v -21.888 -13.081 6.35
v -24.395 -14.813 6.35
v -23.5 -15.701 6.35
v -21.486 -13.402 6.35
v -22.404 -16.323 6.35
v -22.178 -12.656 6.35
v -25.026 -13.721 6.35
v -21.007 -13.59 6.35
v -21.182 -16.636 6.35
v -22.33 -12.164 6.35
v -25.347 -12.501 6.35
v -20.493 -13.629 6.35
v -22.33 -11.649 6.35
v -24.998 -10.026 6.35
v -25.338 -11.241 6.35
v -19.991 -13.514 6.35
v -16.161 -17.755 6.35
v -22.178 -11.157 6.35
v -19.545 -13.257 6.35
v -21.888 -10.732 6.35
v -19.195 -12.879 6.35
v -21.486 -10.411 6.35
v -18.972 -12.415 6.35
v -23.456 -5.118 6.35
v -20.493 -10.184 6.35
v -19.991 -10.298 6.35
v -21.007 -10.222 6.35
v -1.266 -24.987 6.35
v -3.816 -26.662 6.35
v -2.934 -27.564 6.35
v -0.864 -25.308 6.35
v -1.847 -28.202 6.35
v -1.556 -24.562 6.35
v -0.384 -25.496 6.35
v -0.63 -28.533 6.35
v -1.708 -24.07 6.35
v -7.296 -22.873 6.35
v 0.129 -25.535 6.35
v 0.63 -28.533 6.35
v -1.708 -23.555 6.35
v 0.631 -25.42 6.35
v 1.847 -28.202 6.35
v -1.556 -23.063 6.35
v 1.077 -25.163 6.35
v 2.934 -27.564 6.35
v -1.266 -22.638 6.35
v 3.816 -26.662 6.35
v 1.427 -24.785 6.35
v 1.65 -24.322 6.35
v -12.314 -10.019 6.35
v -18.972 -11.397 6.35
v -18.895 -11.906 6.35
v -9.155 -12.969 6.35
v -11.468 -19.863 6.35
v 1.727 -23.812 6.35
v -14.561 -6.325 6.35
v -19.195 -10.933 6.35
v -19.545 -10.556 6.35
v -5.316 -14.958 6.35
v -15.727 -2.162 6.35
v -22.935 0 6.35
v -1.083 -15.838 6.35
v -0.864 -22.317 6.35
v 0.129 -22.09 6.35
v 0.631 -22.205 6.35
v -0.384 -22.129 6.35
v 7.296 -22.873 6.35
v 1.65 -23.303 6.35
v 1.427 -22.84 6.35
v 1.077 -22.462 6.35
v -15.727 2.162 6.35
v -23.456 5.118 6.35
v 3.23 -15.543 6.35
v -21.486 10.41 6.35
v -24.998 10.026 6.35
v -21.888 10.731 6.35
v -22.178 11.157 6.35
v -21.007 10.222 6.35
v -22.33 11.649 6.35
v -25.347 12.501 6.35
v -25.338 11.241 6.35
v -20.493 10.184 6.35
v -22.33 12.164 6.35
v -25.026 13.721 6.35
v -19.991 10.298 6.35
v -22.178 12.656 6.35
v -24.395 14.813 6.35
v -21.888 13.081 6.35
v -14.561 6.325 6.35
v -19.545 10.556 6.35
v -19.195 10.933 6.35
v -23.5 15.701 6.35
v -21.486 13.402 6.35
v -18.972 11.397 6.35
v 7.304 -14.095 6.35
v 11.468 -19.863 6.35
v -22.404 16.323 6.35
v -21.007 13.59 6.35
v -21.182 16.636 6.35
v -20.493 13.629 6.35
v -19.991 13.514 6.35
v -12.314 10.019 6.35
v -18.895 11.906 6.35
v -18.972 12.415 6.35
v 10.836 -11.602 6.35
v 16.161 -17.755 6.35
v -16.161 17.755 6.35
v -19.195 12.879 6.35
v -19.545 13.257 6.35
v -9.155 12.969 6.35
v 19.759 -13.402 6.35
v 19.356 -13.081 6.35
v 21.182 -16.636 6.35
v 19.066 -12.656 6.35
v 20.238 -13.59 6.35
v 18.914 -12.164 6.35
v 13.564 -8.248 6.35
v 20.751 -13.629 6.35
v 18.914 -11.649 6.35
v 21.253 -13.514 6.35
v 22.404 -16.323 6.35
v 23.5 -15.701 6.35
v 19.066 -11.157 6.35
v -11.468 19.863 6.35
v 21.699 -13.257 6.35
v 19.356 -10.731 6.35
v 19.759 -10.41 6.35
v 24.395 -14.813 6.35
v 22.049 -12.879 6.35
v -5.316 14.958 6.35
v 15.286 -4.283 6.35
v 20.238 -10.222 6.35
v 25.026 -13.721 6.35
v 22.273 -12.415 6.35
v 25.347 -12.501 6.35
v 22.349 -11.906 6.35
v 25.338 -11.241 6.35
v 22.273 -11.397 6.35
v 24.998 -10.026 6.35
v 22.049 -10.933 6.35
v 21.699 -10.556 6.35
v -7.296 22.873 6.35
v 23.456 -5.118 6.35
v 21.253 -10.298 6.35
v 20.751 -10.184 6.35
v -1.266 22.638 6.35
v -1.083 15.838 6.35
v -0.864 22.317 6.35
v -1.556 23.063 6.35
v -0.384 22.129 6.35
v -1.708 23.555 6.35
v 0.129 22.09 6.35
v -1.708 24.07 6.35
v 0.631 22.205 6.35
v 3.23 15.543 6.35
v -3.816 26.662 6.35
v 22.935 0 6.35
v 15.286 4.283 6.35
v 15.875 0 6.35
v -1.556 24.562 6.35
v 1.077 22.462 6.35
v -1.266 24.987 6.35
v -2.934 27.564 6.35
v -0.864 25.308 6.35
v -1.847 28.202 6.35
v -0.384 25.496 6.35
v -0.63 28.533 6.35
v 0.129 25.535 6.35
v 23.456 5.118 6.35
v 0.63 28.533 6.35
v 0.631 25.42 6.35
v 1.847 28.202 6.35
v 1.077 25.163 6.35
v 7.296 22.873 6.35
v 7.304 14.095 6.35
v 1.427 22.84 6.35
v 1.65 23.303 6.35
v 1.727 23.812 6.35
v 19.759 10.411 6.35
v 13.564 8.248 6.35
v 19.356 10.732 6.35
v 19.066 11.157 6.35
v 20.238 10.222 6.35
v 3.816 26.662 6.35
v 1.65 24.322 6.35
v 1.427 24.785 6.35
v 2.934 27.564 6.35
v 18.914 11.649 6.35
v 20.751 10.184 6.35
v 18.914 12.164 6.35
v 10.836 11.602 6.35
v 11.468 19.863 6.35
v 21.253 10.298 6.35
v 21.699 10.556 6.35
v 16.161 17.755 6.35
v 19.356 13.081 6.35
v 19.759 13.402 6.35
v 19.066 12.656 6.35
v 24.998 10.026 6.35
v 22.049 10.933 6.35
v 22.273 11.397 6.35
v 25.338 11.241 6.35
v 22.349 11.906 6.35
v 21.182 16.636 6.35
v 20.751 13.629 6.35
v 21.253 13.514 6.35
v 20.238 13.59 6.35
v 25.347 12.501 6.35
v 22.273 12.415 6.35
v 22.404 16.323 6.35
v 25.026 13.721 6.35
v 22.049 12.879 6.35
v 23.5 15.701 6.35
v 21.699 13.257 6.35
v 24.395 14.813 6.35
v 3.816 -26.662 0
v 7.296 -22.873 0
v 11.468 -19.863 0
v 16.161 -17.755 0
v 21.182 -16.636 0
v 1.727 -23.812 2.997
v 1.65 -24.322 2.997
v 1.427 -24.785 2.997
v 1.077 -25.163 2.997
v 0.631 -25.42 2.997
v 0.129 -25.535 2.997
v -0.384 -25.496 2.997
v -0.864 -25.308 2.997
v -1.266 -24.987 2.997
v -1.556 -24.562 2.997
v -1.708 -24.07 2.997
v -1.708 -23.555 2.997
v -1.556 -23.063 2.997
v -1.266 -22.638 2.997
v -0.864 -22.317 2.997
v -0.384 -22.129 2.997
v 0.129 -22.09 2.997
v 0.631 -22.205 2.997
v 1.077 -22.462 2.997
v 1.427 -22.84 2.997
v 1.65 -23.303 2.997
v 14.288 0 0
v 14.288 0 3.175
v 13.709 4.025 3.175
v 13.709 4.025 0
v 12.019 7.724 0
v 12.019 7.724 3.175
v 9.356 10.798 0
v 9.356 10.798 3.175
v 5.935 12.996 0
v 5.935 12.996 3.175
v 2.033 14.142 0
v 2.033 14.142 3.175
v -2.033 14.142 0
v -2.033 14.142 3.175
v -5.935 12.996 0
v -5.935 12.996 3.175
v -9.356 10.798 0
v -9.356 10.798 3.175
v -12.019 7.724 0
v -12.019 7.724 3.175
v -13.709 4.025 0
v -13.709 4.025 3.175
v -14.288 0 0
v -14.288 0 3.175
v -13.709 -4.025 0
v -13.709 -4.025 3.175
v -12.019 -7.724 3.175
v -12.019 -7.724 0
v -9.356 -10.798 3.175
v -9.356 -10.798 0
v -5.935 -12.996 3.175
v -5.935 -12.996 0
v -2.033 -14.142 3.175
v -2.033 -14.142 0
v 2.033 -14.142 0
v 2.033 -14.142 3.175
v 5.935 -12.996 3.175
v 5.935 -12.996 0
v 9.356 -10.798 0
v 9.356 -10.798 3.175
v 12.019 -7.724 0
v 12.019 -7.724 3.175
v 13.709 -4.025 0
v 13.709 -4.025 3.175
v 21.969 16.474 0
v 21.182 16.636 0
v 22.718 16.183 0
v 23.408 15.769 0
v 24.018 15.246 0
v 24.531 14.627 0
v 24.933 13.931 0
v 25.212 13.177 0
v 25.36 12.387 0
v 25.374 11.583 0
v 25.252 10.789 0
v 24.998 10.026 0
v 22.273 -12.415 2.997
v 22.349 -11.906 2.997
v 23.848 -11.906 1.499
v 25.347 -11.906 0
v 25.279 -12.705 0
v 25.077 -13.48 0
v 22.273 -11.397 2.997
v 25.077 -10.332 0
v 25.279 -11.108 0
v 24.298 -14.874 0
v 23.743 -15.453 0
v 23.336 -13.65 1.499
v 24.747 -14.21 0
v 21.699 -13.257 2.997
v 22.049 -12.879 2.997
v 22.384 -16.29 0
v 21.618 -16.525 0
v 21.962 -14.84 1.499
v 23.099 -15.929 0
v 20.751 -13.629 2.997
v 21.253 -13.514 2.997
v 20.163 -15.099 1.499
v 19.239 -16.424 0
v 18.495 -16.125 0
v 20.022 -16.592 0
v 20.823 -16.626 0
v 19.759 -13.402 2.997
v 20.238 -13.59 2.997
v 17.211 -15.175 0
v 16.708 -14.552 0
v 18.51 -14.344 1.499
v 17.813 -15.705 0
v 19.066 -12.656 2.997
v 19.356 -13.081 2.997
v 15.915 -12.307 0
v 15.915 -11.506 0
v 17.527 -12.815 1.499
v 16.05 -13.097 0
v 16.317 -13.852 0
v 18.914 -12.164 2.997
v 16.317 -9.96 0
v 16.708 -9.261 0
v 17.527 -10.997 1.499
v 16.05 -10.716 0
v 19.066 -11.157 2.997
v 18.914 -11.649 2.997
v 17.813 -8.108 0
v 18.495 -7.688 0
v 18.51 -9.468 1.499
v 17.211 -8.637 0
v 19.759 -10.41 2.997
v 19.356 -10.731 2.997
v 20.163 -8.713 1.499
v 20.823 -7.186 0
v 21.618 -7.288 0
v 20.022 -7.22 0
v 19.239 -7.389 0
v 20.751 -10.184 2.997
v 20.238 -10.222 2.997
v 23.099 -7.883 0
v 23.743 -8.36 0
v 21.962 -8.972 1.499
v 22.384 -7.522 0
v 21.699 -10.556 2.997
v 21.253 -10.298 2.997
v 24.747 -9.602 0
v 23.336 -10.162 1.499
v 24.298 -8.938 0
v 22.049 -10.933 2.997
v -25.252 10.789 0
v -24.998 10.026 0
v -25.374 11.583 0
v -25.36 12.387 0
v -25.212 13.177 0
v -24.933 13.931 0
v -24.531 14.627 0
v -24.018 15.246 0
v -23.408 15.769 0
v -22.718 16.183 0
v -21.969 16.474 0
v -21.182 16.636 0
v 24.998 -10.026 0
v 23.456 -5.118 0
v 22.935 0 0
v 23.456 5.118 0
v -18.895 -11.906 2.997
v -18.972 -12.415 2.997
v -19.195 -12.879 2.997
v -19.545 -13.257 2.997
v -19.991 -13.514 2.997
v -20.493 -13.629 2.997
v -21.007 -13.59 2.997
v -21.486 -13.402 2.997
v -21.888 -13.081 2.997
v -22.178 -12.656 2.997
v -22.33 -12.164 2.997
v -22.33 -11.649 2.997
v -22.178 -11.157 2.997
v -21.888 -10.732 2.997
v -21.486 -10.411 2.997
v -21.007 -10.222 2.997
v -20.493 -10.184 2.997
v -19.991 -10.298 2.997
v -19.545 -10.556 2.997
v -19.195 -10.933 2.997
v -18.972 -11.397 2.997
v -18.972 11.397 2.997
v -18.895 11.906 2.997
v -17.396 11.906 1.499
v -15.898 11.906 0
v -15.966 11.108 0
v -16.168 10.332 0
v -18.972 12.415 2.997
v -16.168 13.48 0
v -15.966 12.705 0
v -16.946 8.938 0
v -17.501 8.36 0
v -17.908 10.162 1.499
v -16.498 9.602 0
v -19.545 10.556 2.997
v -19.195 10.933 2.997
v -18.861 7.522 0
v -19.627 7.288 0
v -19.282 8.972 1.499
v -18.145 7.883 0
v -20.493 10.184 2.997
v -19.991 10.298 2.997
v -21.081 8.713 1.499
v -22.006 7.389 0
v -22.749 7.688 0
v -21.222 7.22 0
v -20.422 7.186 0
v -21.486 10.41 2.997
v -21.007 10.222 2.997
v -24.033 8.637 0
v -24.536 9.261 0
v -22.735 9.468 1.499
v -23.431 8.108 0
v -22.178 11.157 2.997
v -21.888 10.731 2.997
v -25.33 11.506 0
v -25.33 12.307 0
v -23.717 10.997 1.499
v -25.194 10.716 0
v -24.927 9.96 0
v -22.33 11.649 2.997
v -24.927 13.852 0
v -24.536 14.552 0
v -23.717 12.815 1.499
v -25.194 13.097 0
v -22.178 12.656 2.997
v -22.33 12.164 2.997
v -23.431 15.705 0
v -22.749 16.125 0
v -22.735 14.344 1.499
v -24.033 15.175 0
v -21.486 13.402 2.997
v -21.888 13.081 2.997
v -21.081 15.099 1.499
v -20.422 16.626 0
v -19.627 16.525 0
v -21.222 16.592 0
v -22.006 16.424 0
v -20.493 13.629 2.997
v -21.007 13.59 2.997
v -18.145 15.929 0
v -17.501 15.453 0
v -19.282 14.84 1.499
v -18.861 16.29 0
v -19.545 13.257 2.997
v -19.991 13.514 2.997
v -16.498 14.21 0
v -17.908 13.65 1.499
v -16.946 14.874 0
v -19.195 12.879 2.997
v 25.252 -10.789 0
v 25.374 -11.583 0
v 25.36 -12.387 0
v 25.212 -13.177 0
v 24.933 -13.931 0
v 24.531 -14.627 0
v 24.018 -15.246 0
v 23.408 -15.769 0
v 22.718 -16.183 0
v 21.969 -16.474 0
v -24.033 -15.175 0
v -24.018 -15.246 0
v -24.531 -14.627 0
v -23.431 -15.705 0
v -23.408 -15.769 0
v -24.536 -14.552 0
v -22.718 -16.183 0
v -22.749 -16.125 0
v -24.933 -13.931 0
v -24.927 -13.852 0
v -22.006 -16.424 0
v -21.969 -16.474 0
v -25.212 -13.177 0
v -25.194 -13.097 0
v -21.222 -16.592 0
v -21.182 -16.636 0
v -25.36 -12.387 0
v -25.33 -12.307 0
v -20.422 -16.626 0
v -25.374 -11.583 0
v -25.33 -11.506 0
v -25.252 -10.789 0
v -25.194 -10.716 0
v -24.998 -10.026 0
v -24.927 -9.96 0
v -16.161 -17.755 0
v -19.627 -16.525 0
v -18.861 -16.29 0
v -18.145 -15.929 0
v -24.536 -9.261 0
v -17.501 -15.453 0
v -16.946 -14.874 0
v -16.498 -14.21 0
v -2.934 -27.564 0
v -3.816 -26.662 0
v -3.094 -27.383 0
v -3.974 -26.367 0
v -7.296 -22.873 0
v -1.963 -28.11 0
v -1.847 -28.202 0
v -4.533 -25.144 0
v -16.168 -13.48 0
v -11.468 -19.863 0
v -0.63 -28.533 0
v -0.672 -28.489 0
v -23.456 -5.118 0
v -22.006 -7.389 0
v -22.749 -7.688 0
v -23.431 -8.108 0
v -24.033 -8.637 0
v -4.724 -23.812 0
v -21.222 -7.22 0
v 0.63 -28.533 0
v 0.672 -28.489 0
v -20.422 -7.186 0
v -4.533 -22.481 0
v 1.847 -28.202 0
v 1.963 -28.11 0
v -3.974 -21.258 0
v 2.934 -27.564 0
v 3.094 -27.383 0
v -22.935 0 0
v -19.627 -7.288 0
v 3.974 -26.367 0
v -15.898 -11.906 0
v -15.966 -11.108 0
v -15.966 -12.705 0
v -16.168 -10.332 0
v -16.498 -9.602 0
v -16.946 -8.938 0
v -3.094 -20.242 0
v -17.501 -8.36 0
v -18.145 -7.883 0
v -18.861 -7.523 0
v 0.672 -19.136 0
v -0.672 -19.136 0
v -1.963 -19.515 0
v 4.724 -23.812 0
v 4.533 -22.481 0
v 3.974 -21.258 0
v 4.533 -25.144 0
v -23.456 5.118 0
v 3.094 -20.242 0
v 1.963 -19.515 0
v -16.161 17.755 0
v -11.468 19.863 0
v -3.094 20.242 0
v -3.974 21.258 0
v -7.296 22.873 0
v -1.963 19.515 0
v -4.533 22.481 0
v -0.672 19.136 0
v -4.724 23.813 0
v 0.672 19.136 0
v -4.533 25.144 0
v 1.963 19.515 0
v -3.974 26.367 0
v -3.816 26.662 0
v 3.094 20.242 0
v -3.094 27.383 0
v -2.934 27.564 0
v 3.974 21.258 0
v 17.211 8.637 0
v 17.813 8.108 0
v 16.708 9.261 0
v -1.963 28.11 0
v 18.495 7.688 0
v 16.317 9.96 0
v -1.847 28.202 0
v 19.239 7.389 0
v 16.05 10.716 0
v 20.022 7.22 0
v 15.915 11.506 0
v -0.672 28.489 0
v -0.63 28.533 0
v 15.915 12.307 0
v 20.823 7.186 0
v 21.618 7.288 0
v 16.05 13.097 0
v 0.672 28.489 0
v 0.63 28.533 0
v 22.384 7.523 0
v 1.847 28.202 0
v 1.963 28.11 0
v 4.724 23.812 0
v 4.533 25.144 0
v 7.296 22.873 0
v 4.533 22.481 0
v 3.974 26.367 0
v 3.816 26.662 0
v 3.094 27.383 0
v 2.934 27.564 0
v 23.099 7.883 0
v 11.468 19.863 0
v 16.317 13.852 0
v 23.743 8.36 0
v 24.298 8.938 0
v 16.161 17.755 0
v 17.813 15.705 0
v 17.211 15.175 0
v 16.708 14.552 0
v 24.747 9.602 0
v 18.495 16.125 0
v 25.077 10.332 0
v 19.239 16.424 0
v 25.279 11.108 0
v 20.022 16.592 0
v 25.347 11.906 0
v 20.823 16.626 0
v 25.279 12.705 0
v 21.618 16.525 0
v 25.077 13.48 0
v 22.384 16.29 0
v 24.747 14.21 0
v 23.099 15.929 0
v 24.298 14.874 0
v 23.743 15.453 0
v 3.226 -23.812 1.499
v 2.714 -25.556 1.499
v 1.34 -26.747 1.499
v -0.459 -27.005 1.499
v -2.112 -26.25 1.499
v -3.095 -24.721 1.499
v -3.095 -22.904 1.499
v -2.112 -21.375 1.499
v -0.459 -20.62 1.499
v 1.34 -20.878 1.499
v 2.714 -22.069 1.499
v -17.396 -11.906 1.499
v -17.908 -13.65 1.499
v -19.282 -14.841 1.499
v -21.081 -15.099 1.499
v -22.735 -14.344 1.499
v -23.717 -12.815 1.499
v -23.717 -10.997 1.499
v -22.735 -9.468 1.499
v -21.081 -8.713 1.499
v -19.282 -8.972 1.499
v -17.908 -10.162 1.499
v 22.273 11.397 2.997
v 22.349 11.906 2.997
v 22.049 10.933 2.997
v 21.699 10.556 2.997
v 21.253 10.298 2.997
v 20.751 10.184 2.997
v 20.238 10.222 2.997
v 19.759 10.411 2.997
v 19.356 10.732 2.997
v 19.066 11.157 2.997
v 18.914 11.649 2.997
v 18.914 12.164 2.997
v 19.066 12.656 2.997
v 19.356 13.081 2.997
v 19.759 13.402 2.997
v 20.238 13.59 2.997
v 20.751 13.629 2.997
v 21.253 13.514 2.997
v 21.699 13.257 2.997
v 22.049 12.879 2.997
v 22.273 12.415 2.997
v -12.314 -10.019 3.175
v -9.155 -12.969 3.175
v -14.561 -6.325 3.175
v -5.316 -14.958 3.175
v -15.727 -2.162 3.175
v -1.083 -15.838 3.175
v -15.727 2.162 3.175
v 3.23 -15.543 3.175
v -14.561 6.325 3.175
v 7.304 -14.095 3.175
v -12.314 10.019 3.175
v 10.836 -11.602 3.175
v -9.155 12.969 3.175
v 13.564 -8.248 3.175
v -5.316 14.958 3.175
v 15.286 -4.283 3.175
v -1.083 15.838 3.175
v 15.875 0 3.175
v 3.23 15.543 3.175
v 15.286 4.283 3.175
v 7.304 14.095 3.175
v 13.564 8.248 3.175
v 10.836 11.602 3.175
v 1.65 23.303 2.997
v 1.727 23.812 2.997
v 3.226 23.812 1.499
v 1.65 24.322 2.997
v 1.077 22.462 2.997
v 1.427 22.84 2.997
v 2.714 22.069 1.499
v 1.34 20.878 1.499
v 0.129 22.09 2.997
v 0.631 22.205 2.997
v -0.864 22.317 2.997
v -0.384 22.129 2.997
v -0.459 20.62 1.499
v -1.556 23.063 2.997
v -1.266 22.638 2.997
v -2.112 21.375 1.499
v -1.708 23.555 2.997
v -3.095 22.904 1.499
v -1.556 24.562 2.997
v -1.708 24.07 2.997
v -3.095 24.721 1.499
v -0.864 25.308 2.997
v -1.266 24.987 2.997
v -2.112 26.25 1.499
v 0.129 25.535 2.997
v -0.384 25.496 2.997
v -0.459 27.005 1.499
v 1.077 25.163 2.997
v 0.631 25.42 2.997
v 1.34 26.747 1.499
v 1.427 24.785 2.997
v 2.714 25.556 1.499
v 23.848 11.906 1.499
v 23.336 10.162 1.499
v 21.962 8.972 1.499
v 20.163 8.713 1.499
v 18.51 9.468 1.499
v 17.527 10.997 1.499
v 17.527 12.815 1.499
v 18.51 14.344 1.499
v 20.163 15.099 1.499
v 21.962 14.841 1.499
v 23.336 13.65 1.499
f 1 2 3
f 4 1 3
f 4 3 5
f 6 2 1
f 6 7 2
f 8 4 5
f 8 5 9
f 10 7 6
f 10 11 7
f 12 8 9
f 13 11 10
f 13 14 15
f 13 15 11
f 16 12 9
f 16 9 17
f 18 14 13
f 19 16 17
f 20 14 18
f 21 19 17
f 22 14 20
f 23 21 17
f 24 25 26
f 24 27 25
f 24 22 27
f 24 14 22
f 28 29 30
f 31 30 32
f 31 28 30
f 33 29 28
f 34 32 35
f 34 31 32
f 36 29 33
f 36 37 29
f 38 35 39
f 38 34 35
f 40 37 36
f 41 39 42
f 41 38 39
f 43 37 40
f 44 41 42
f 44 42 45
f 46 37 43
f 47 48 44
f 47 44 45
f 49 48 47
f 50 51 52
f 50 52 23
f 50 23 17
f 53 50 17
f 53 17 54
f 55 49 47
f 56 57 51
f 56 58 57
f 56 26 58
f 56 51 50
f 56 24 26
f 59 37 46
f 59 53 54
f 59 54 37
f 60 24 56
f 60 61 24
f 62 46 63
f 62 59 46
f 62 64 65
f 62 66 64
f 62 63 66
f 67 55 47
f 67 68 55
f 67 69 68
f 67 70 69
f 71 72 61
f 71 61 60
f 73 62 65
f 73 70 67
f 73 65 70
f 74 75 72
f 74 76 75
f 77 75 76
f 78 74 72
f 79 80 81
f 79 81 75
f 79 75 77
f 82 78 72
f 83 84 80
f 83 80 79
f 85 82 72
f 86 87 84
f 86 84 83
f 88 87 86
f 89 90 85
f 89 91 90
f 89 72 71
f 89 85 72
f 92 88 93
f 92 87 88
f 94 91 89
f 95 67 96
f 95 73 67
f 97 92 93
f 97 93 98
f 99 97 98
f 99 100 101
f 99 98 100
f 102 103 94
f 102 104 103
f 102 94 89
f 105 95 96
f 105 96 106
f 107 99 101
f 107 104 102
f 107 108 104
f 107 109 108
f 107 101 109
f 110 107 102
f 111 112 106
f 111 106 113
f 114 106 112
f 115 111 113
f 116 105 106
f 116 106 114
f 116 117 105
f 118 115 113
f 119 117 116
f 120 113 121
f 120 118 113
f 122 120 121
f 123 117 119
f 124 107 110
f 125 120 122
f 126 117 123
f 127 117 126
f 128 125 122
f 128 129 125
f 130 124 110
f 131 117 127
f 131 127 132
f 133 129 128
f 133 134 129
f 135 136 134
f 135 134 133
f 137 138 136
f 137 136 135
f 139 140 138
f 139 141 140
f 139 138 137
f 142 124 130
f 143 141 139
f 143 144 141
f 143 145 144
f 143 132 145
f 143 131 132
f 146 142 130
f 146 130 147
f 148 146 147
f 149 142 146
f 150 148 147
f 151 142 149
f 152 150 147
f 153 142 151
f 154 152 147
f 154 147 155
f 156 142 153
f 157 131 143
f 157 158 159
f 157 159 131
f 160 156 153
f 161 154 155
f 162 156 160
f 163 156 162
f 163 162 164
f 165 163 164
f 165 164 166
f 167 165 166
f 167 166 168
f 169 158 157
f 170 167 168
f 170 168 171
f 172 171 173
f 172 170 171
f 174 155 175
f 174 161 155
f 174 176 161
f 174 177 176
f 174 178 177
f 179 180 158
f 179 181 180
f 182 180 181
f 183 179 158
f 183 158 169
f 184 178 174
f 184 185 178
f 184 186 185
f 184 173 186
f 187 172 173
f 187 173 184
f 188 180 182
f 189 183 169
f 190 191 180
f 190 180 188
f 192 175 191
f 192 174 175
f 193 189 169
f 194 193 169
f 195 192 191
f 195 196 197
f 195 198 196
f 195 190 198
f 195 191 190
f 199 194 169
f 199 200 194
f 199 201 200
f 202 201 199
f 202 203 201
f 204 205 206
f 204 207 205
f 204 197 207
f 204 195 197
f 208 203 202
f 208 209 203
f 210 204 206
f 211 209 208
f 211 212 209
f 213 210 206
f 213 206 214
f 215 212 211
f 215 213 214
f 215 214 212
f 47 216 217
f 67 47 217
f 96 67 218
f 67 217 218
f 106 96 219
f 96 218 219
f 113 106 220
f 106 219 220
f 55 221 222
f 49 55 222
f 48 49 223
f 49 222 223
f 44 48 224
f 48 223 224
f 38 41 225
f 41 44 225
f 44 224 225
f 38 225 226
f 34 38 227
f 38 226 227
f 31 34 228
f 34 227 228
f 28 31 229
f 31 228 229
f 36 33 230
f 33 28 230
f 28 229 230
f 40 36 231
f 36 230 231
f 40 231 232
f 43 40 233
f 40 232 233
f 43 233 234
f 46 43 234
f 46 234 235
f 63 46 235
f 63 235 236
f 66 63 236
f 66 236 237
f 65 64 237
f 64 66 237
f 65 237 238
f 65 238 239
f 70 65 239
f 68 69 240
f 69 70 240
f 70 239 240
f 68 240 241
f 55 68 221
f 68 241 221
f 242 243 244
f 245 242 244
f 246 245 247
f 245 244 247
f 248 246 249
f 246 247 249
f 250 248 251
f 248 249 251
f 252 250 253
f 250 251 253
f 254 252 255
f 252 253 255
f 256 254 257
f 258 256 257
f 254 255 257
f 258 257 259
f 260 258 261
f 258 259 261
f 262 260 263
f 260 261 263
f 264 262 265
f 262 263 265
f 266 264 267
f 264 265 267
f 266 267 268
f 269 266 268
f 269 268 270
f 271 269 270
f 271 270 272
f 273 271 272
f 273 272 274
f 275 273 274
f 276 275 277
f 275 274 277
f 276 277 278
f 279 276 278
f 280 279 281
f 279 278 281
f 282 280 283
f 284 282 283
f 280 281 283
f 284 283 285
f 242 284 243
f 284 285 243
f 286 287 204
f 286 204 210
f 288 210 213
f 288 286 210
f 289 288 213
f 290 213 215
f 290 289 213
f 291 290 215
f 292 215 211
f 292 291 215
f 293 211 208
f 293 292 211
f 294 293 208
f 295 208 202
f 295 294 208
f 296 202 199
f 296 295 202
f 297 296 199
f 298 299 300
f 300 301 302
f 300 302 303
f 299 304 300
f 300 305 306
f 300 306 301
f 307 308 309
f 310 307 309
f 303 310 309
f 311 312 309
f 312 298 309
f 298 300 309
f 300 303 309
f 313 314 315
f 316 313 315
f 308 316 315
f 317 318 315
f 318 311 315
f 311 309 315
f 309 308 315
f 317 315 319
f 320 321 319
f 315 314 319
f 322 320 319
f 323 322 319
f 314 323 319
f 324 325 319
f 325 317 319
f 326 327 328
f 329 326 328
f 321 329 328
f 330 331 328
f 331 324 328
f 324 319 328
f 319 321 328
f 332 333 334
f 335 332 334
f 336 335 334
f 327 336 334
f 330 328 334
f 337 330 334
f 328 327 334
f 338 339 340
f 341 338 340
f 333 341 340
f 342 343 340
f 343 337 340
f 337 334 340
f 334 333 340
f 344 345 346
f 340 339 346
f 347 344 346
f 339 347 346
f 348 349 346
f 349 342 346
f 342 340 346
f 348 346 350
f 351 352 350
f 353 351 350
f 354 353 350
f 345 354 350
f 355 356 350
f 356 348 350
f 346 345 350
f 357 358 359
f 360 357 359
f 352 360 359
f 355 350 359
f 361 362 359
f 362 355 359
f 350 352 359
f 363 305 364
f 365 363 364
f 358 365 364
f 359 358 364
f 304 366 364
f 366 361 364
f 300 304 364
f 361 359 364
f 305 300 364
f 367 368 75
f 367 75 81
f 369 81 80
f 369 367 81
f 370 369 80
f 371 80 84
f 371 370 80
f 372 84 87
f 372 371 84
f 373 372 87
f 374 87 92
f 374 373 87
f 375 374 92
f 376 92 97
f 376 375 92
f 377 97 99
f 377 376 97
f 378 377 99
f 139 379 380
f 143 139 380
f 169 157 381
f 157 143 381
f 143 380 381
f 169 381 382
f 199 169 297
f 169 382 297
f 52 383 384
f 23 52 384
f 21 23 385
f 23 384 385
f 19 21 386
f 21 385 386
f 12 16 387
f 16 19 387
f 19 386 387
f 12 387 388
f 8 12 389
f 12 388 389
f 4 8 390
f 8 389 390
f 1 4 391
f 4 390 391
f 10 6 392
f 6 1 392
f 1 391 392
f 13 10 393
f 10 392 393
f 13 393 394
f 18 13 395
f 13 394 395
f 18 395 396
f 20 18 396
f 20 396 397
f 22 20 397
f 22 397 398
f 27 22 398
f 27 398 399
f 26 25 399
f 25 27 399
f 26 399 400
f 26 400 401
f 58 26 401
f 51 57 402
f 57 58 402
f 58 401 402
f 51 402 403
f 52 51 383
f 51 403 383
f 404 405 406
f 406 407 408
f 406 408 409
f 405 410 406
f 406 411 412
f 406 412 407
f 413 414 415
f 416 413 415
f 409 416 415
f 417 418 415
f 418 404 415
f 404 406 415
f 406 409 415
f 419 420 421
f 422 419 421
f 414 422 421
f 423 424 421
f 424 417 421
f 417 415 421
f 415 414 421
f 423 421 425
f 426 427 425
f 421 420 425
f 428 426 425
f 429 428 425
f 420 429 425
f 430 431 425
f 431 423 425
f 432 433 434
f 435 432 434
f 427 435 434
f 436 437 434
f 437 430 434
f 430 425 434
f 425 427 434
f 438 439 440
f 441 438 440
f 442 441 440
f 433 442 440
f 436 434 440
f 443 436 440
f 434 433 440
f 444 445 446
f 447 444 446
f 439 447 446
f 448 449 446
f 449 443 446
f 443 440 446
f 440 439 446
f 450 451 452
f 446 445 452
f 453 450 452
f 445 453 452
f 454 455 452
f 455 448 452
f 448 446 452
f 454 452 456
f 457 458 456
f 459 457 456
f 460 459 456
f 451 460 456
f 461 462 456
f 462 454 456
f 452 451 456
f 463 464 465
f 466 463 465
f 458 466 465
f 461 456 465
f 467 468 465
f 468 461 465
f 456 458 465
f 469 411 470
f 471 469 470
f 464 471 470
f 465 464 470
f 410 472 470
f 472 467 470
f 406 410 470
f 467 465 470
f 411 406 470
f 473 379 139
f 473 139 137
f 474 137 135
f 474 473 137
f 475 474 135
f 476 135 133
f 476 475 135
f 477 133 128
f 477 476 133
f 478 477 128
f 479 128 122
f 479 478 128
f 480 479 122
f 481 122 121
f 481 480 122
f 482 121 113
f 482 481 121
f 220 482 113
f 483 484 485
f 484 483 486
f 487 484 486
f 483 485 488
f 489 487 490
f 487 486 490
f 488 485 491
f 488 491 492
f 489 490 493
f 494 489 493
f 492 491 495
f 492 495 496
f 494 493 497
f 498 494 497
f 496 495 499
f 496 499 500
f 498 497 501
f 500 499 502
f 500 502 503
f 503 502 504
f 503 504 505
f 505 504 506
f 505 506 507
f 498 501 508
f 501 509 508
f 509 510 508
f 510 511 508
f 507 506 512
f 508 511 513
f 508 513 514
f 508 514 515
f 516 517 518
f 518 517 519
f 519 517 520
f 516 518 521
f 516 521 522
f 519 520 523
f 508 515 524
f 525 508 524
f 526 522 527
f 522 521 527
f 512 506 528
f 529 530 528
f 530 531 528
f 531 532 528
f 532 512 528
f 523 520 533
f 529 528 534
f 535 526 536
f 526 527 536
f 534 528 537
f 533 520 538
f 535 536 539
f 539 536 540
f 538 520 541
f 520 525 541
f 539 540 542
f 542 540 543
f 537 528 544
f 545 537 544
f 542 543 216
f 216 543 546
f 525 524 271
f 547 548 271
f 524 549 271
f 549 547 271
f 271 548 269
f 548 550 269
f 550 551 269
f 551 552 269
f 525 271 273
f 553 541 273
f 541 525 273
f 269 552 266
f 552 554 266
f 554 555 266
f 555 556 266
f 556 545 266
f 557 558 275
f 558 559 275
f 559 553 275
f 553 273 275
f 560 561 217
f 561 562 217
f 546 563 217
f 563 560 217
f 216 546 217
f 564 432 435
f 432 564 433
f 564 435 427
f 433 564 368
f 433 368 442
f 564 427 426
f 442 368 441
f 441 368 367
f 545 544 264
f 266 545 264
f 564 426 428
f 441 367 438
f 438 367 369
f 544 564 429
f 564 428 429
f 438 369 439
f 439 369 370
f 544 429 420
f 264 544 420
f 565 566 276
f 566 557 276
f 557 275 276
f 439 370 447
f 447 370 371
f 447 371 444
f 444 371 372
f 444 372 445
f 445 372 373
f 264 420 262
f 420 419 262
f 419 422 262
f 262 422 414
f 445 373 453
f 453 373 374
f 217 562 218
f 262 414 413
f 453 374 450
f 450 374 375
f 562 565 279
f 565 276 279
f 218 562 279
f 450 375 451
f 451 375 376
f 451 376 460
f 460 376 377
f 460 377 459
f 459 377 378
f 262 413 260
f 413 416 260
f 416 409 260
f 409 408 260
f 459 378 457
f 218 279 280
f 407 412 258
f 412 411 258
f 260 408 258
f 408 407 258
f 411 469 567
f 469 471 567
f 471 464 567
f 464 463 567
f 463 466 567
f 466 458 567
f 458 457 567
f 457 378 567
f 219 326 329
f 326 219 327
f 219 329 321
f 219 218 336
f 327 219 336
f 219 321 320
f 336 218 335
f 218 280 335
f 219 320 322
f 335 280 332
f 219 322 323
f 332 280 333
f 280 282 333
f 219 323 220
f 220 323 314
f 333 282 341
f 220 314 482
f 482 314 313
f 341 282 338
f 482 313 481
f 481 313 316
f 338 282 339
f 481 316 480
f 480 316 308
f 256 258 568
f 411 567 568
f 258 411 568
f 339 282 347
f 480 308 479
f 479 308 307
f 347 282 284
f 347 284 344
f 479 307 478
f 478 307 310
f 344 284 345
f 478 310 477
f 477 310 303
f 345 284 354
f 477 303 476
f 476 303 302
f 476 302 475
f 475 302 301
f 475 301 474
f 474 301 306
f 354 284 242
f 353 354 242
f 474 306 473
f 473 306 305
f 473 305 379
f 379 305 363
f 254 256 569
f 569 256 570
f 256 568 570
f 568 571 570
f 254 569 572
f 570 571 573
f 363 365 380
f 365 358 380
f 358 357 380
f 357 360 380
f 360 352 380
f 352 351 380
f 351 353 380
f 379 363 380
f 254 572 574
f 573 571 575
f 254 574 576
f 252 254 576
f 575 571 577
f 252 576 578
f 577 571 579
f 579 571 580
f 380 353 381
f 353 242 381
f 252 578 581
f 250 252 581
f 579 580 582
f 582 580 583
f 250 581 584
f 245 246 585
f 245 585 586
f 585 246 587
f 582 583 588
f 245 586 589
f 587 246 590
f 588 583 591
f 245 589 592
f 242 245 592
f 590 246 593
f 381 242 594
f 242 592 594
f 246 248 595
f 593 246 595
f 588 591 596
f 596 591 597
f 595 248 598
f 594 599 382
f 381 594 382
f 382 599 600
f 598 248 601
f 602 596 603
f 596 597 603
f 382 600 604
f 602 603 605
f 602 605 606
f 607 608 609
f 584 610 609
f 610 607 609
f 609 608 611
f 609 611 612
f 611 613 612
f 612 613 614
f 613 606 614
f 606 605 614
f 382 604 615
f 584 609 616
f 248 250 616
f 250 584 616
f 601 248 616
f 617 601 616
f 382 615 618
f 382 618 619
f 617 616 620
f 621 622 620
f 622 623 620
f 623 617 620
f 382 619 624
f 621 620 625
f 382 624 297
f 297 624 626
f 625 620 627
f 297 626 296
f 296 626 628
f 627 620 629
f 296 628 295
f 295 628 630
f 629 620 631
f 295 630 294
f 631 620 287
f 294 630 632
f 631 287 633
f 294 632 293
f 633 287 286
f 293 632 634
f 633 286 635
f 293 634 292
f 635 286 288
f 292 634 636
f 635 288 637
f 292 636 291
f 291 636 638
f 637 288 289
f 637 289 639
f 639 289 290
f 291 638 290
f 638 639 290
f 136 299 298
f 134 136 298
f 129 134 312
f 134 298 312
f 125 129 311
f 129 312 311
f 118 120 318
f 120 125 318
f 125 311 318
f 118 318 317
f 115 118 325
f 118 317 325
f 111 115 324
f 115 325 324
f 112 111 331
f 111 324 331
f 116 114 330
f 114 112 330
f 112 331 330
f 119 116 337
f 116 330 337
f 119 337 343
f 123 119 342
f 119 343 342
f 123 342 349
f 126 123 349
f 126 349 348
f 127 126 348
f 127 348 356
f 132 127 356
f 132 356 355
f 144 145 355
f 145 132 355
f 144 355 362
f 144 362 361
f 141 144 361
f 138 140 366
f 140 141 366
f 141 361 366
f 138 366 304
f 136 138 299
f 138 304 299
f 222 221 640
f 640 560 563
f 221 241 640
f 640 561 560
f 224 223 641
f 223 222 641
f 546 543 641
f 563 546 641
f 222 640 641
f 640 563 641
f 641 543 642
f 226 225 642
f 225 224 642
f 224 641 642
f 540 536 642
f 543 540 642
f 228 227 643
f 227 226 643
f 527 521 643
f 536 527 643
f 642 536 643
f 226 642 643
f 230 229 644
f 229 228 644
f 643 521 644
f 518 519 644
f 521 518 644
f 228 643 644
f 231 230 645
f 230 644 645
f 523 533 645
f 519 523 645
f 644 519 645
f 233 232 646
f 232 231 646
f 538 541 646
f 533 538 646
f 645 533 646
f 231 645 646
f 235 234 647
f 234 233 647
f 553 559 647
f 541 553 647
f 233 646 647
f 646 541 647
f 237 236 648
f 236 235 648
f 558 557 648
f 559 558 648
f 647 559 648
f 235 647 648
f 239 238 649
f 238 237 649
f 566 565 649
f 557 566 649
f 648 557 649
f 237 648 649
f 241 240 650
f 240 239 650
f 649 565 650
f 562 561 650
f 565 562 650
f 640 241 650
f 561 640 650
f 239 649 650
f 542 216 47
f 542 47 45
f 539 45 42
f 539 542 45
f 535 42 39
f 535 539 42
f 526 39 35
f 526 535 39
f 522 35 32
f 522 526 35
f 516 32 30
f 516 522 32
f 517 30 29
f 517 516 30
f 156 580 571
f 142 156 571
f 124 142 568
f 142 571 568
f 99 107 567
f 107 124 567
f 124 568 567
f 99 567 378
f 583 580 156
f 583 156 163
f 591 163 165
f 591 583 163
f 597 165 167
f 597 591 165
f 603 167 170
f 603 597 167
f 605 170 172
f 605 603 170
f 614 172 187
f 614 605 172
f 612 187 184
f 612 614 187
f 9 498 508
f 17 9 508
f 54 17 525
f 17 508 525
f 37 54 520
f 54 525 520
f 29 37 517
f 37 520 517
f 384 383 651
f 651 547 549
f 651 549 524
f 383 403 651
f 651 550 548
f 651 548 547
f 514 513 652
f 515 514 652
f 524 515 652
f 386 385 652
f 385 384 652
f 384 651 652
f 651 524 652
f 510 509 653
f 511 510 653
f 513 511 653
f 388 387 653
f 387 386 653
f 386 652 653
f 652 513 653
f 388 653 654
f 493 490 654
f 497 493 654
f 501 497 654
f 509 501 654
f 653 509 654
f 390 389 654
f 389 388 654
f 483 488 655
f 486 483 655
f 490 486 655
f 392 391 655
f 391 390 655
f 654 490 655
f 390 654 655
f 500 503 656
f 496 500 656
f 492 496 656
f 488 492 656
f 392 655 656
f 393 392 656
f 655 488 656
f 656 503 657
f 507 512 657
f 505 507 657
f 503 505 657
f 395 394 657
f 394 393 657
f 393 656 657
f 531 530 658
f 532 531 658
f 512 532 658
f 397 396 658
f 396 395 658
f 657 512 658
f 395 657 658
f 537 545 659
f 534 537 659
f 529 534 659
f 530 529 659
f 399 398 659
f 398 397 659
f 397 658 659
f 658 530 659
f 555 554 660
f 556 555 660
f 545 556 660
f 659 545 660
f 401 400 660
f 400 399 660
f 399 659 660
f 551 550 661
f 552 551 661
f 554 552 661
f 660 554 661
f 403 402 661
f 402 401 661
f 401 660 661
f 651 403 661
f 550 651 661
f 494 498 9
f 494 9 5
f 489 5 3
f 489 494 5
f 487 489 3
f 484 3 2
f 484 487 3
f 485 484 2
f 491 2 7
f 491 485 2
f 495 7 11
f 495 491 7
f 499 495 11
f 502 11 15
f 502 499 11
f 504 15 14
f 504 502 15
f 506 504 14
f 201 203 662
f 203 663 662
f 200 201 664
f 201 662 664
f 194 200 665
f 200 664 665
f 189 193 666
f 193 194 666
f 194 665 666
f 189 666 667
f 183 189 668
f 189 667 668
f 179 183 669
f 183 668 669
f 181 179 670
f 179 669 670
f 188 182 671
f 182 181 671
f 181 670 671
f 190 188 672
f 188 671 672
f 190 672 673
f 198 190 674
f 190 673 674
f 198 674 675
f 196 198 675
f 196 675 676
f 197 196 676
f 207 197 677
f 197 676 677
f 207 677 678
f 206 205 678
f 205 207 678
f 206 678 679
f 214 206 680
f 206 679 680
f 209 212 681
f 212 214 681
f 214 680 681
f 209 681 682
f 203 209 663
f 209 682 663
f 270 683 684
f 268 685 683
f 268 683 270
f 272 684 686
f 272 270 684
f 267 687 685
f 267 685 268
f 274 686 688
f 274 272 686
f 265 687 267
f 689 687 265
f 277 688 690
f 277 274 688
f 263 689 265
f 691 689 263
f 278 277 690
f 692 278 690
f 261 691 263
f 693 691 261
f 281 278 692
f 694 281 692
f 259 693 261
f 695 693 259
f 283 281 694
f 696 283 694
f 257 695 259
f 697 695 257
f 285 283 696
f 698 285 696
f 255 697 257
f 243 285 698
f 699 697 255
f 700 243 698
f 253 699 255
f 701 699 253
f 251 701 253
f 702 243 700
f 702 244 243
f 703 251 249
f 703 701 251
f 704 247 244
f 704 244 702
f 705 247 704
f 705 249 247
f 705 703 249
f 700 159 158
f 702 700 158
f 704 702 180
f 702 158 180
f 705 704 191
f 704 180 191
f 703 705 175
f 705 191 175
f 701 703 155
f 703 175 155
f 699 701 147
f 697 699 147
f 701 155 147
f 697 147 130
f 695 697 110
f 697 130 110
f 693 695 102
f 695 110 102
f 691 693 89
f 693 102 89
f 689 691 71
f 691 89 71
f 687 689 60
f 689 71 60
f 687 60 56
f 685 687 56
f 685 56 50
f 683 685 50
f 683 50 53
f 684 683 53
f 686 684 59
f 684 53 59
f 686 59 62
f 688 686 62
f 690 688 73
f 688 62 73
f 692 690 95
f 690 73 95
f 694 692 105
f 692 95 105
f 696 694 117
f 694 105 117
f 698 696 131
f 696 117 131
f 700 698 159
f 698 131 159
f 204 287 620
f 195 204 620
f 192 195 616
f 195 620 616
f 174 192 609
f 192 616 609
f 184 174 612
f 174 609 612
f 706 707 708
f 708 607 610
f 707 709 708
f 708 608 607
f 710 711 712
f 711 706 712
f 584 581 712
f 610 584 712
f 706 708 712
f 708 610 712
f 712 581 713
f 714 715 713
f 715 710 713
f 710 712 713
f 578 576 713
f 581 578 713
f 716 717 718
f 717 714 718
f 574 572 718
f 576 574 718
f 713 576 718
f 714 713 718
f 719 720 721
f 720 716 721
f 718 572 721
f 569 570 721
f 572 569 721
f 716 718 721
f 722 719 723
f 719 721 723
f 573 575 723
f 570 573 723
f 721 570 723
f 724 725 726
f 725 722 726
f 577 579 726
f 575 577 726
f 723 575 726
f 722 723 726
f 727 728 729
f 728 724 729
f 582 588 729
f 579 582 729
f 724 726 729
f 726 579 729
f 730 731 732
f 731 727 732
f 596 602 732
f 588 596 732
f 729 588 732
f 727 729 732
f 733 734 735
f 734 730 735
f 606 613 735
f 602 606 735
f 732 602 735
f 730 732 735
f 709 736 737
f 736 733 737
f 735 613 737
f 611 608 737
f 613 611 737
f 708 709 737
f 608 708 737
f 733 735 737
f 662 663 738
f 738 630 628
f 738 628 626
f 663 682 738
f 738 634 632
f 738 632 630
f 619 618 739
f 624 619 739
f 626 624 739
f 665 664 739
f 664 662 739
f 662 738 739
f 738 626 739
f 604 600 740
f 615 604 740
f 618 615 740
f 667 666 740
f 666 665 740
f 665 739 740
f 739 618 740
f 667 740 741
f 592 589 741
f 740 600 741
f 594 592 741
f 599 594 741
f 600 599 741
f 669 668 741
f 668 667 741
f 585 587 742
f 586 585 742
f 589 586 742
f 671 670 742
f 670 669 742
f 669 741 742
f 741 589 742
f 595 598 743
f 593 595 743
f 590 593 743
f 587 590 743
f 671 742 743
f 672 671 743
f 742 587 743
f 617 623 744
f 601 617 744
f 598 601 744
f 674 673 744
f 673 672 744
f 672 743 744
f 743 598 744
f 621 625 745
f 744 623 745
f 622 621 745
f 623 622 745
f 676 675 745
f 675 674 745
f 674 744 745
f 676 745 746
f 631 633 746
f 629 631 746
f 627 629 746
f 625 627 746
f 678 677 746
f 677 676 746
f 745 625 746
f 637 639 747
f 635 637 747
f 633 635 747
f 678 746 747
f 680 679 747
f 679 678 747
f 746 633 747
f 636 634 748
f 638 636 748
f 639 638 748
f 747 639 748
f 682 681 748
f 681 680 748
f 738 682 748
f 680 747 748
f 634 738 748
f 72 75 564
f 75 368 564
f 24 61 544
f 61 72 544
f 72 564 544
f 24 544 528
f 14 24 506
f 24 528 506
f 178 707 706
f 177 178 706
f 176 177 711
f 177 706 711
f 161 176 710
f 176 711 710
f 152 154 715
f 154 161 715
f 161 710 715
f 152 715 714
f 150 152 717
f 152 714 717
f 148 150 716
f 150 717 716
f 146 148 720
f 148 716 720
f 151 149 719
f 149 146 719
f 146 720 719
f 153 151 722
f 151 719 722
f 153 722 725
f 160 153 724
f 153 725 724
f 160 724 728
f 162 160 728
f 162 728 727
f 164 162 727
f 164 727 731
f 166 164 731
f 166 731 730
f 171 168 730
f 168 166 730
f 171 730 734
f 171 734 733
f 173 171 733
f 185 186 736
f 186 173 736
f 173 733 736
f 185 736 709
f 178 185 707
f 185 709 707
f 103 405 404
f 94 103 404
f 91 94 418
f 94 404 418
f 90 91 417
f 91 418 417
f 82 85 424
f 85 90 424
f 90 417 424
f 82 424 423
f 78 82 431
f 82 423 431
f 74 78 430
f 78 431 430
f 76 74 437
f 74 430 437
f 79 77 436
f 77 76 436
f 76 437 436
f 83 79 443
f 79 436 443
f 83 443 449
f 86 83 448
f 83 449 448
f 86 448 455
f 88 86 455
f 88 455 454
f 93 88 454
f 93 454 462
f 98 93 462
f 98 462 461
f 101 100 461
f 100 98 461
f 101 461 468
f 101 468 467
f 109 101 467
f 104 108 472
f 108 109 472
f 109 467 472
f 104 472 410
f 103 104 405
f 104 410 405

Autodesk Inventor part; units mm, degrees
ref_plane "YZ Plane" through (0, 0, 0) normal (1, 0, 0) x (0, 1, 0)
ref_plane "XZ Plane" through (0, 0, 0) normal (0, 1, 0) x (-1, 0, 0)
ref_plane "XY Plane" through (0, 0, 0) normal (0, 0, 1) x (1, 0, 0)
surface "Composite1"
sketch "Sketch2" plane through (0, -23.8125, 0) normal (0, 0, 1) x (1, 0, 0)
  arc A0 (3.8159, 50.4746) -> (21.182, 40.4482) centre (24.1677, 65.6722) ccw projected
  arc A1 (3.8159, 50.4746) -> (-3.8159, 50.4746) centre (0, 47.625) ccw projected
  arc A2 (-21.182, 40.4482) -> (-3.8159, 50.4746) centre (-24.1677, 65.6722) ccw projected
  arc A3 (-21.182, 40.4482) -> (-24.998, 33.8388) centre (-20.6222, 35.7187) ccw projected
  arc A4 (-24.998, 13.7862) -> (-24.998, 33.8388) centre (-48.3354, 23.8125) ccw projected
  arc A5 (-24.998, 13.7862) -> (-21.182, 7.1768) centre (-20.6222, 11.9062) ccw projected
  arc A6 (-3.8159, -2.8496) -> (-21.182, 7.1768) centre (-24.1677, -18.0472) ccw projected
  arc A7 (-3.8159, -2.8496) -> (3.8159, -2.8496) centre (0, 0) ccw projected
  arc A8 (21.182, 7.1768) -> (3.8159, -2.8496) centre (24.1677, -18.0472) ccw projected
  arc A9 (21.182, 7.1768) -> (24.998, 13.7862) centre (20.6222, 11.9063) ccw projected
  arc A10 (24.998, 33.8388) -> (24.998, 13.7862) centre (48.3354, 23.8125) ccw projected
  arc A11 (24.998, 33.8388) -> (21.182, 40.4482) centre (20.6222, 35.7188) ccw projected
  circle A12 centre (0, 47.625) radius 1.7272 projected
  circle A13 centre (20.6222, 35.7188) radius 1.7272 projected
  circle A14 centre (20.6222, 11.9063) radius 1.7272 projected
  circle A15 centre (0, 0) radius 1.7272 projected
  circle A16 centre (-20.6222, 11.9062) radius 1.7272 projected
  circle A17 centre (-20.6222, 35.7187) radius 1.7272 projected
  arc A18 (14.2875, 23.8125) -> (-14.2875, 23.8125) centre (0, 23.8125) ccw projected
  arc A19 (-14.2875, 23.8125) -> (14.2875, 23.8125) centre (0, 23.8125) ccw projected
  circle A20 centre (0, 23.8125) radius 12.7 projected
extrude "Extrusion1" add sketch "Sketch2" along normal blind 6.35 contours A0 A11 A10 A9 A8 A7 A6 A5 A4 A3 A2 A1
extrude "Extrusion2" add sketch "Sketch2" along normal blind 3.175 contours A19 A18
sketch "Sketch3" plane through (0, -23.8125, 6.35) normal (0, 0, 1) x (1, 0, 0)
  circle A0 centre (0, 23.8125) radius 14.2875 projected
  circle A1 centre (0, 23.8125) radius 15.875
  circle A2 centre (0, 23.8125) radius 12.7 projected
  dimension "d4" = 31.75
extrude "Extrusion3" cut sketch "Sketch3" against normal blind 3.175 contours A1
extrude "Extrusion4" cut sketch "Sketch3" against normal through all contours A0
chamfer "Chamfer1" distance 2.9972 angle 45 6 edges at (18.895, 11.9063, 0) (-1.7272, 23.8125, 0) (-22.3494, 11.9063, 0) (-22.3494, -11.9062, 0) (-1.7272, -23.8125, 0) (18.895, -11.9062, 0)
properties part number "lower box bolt plate"
